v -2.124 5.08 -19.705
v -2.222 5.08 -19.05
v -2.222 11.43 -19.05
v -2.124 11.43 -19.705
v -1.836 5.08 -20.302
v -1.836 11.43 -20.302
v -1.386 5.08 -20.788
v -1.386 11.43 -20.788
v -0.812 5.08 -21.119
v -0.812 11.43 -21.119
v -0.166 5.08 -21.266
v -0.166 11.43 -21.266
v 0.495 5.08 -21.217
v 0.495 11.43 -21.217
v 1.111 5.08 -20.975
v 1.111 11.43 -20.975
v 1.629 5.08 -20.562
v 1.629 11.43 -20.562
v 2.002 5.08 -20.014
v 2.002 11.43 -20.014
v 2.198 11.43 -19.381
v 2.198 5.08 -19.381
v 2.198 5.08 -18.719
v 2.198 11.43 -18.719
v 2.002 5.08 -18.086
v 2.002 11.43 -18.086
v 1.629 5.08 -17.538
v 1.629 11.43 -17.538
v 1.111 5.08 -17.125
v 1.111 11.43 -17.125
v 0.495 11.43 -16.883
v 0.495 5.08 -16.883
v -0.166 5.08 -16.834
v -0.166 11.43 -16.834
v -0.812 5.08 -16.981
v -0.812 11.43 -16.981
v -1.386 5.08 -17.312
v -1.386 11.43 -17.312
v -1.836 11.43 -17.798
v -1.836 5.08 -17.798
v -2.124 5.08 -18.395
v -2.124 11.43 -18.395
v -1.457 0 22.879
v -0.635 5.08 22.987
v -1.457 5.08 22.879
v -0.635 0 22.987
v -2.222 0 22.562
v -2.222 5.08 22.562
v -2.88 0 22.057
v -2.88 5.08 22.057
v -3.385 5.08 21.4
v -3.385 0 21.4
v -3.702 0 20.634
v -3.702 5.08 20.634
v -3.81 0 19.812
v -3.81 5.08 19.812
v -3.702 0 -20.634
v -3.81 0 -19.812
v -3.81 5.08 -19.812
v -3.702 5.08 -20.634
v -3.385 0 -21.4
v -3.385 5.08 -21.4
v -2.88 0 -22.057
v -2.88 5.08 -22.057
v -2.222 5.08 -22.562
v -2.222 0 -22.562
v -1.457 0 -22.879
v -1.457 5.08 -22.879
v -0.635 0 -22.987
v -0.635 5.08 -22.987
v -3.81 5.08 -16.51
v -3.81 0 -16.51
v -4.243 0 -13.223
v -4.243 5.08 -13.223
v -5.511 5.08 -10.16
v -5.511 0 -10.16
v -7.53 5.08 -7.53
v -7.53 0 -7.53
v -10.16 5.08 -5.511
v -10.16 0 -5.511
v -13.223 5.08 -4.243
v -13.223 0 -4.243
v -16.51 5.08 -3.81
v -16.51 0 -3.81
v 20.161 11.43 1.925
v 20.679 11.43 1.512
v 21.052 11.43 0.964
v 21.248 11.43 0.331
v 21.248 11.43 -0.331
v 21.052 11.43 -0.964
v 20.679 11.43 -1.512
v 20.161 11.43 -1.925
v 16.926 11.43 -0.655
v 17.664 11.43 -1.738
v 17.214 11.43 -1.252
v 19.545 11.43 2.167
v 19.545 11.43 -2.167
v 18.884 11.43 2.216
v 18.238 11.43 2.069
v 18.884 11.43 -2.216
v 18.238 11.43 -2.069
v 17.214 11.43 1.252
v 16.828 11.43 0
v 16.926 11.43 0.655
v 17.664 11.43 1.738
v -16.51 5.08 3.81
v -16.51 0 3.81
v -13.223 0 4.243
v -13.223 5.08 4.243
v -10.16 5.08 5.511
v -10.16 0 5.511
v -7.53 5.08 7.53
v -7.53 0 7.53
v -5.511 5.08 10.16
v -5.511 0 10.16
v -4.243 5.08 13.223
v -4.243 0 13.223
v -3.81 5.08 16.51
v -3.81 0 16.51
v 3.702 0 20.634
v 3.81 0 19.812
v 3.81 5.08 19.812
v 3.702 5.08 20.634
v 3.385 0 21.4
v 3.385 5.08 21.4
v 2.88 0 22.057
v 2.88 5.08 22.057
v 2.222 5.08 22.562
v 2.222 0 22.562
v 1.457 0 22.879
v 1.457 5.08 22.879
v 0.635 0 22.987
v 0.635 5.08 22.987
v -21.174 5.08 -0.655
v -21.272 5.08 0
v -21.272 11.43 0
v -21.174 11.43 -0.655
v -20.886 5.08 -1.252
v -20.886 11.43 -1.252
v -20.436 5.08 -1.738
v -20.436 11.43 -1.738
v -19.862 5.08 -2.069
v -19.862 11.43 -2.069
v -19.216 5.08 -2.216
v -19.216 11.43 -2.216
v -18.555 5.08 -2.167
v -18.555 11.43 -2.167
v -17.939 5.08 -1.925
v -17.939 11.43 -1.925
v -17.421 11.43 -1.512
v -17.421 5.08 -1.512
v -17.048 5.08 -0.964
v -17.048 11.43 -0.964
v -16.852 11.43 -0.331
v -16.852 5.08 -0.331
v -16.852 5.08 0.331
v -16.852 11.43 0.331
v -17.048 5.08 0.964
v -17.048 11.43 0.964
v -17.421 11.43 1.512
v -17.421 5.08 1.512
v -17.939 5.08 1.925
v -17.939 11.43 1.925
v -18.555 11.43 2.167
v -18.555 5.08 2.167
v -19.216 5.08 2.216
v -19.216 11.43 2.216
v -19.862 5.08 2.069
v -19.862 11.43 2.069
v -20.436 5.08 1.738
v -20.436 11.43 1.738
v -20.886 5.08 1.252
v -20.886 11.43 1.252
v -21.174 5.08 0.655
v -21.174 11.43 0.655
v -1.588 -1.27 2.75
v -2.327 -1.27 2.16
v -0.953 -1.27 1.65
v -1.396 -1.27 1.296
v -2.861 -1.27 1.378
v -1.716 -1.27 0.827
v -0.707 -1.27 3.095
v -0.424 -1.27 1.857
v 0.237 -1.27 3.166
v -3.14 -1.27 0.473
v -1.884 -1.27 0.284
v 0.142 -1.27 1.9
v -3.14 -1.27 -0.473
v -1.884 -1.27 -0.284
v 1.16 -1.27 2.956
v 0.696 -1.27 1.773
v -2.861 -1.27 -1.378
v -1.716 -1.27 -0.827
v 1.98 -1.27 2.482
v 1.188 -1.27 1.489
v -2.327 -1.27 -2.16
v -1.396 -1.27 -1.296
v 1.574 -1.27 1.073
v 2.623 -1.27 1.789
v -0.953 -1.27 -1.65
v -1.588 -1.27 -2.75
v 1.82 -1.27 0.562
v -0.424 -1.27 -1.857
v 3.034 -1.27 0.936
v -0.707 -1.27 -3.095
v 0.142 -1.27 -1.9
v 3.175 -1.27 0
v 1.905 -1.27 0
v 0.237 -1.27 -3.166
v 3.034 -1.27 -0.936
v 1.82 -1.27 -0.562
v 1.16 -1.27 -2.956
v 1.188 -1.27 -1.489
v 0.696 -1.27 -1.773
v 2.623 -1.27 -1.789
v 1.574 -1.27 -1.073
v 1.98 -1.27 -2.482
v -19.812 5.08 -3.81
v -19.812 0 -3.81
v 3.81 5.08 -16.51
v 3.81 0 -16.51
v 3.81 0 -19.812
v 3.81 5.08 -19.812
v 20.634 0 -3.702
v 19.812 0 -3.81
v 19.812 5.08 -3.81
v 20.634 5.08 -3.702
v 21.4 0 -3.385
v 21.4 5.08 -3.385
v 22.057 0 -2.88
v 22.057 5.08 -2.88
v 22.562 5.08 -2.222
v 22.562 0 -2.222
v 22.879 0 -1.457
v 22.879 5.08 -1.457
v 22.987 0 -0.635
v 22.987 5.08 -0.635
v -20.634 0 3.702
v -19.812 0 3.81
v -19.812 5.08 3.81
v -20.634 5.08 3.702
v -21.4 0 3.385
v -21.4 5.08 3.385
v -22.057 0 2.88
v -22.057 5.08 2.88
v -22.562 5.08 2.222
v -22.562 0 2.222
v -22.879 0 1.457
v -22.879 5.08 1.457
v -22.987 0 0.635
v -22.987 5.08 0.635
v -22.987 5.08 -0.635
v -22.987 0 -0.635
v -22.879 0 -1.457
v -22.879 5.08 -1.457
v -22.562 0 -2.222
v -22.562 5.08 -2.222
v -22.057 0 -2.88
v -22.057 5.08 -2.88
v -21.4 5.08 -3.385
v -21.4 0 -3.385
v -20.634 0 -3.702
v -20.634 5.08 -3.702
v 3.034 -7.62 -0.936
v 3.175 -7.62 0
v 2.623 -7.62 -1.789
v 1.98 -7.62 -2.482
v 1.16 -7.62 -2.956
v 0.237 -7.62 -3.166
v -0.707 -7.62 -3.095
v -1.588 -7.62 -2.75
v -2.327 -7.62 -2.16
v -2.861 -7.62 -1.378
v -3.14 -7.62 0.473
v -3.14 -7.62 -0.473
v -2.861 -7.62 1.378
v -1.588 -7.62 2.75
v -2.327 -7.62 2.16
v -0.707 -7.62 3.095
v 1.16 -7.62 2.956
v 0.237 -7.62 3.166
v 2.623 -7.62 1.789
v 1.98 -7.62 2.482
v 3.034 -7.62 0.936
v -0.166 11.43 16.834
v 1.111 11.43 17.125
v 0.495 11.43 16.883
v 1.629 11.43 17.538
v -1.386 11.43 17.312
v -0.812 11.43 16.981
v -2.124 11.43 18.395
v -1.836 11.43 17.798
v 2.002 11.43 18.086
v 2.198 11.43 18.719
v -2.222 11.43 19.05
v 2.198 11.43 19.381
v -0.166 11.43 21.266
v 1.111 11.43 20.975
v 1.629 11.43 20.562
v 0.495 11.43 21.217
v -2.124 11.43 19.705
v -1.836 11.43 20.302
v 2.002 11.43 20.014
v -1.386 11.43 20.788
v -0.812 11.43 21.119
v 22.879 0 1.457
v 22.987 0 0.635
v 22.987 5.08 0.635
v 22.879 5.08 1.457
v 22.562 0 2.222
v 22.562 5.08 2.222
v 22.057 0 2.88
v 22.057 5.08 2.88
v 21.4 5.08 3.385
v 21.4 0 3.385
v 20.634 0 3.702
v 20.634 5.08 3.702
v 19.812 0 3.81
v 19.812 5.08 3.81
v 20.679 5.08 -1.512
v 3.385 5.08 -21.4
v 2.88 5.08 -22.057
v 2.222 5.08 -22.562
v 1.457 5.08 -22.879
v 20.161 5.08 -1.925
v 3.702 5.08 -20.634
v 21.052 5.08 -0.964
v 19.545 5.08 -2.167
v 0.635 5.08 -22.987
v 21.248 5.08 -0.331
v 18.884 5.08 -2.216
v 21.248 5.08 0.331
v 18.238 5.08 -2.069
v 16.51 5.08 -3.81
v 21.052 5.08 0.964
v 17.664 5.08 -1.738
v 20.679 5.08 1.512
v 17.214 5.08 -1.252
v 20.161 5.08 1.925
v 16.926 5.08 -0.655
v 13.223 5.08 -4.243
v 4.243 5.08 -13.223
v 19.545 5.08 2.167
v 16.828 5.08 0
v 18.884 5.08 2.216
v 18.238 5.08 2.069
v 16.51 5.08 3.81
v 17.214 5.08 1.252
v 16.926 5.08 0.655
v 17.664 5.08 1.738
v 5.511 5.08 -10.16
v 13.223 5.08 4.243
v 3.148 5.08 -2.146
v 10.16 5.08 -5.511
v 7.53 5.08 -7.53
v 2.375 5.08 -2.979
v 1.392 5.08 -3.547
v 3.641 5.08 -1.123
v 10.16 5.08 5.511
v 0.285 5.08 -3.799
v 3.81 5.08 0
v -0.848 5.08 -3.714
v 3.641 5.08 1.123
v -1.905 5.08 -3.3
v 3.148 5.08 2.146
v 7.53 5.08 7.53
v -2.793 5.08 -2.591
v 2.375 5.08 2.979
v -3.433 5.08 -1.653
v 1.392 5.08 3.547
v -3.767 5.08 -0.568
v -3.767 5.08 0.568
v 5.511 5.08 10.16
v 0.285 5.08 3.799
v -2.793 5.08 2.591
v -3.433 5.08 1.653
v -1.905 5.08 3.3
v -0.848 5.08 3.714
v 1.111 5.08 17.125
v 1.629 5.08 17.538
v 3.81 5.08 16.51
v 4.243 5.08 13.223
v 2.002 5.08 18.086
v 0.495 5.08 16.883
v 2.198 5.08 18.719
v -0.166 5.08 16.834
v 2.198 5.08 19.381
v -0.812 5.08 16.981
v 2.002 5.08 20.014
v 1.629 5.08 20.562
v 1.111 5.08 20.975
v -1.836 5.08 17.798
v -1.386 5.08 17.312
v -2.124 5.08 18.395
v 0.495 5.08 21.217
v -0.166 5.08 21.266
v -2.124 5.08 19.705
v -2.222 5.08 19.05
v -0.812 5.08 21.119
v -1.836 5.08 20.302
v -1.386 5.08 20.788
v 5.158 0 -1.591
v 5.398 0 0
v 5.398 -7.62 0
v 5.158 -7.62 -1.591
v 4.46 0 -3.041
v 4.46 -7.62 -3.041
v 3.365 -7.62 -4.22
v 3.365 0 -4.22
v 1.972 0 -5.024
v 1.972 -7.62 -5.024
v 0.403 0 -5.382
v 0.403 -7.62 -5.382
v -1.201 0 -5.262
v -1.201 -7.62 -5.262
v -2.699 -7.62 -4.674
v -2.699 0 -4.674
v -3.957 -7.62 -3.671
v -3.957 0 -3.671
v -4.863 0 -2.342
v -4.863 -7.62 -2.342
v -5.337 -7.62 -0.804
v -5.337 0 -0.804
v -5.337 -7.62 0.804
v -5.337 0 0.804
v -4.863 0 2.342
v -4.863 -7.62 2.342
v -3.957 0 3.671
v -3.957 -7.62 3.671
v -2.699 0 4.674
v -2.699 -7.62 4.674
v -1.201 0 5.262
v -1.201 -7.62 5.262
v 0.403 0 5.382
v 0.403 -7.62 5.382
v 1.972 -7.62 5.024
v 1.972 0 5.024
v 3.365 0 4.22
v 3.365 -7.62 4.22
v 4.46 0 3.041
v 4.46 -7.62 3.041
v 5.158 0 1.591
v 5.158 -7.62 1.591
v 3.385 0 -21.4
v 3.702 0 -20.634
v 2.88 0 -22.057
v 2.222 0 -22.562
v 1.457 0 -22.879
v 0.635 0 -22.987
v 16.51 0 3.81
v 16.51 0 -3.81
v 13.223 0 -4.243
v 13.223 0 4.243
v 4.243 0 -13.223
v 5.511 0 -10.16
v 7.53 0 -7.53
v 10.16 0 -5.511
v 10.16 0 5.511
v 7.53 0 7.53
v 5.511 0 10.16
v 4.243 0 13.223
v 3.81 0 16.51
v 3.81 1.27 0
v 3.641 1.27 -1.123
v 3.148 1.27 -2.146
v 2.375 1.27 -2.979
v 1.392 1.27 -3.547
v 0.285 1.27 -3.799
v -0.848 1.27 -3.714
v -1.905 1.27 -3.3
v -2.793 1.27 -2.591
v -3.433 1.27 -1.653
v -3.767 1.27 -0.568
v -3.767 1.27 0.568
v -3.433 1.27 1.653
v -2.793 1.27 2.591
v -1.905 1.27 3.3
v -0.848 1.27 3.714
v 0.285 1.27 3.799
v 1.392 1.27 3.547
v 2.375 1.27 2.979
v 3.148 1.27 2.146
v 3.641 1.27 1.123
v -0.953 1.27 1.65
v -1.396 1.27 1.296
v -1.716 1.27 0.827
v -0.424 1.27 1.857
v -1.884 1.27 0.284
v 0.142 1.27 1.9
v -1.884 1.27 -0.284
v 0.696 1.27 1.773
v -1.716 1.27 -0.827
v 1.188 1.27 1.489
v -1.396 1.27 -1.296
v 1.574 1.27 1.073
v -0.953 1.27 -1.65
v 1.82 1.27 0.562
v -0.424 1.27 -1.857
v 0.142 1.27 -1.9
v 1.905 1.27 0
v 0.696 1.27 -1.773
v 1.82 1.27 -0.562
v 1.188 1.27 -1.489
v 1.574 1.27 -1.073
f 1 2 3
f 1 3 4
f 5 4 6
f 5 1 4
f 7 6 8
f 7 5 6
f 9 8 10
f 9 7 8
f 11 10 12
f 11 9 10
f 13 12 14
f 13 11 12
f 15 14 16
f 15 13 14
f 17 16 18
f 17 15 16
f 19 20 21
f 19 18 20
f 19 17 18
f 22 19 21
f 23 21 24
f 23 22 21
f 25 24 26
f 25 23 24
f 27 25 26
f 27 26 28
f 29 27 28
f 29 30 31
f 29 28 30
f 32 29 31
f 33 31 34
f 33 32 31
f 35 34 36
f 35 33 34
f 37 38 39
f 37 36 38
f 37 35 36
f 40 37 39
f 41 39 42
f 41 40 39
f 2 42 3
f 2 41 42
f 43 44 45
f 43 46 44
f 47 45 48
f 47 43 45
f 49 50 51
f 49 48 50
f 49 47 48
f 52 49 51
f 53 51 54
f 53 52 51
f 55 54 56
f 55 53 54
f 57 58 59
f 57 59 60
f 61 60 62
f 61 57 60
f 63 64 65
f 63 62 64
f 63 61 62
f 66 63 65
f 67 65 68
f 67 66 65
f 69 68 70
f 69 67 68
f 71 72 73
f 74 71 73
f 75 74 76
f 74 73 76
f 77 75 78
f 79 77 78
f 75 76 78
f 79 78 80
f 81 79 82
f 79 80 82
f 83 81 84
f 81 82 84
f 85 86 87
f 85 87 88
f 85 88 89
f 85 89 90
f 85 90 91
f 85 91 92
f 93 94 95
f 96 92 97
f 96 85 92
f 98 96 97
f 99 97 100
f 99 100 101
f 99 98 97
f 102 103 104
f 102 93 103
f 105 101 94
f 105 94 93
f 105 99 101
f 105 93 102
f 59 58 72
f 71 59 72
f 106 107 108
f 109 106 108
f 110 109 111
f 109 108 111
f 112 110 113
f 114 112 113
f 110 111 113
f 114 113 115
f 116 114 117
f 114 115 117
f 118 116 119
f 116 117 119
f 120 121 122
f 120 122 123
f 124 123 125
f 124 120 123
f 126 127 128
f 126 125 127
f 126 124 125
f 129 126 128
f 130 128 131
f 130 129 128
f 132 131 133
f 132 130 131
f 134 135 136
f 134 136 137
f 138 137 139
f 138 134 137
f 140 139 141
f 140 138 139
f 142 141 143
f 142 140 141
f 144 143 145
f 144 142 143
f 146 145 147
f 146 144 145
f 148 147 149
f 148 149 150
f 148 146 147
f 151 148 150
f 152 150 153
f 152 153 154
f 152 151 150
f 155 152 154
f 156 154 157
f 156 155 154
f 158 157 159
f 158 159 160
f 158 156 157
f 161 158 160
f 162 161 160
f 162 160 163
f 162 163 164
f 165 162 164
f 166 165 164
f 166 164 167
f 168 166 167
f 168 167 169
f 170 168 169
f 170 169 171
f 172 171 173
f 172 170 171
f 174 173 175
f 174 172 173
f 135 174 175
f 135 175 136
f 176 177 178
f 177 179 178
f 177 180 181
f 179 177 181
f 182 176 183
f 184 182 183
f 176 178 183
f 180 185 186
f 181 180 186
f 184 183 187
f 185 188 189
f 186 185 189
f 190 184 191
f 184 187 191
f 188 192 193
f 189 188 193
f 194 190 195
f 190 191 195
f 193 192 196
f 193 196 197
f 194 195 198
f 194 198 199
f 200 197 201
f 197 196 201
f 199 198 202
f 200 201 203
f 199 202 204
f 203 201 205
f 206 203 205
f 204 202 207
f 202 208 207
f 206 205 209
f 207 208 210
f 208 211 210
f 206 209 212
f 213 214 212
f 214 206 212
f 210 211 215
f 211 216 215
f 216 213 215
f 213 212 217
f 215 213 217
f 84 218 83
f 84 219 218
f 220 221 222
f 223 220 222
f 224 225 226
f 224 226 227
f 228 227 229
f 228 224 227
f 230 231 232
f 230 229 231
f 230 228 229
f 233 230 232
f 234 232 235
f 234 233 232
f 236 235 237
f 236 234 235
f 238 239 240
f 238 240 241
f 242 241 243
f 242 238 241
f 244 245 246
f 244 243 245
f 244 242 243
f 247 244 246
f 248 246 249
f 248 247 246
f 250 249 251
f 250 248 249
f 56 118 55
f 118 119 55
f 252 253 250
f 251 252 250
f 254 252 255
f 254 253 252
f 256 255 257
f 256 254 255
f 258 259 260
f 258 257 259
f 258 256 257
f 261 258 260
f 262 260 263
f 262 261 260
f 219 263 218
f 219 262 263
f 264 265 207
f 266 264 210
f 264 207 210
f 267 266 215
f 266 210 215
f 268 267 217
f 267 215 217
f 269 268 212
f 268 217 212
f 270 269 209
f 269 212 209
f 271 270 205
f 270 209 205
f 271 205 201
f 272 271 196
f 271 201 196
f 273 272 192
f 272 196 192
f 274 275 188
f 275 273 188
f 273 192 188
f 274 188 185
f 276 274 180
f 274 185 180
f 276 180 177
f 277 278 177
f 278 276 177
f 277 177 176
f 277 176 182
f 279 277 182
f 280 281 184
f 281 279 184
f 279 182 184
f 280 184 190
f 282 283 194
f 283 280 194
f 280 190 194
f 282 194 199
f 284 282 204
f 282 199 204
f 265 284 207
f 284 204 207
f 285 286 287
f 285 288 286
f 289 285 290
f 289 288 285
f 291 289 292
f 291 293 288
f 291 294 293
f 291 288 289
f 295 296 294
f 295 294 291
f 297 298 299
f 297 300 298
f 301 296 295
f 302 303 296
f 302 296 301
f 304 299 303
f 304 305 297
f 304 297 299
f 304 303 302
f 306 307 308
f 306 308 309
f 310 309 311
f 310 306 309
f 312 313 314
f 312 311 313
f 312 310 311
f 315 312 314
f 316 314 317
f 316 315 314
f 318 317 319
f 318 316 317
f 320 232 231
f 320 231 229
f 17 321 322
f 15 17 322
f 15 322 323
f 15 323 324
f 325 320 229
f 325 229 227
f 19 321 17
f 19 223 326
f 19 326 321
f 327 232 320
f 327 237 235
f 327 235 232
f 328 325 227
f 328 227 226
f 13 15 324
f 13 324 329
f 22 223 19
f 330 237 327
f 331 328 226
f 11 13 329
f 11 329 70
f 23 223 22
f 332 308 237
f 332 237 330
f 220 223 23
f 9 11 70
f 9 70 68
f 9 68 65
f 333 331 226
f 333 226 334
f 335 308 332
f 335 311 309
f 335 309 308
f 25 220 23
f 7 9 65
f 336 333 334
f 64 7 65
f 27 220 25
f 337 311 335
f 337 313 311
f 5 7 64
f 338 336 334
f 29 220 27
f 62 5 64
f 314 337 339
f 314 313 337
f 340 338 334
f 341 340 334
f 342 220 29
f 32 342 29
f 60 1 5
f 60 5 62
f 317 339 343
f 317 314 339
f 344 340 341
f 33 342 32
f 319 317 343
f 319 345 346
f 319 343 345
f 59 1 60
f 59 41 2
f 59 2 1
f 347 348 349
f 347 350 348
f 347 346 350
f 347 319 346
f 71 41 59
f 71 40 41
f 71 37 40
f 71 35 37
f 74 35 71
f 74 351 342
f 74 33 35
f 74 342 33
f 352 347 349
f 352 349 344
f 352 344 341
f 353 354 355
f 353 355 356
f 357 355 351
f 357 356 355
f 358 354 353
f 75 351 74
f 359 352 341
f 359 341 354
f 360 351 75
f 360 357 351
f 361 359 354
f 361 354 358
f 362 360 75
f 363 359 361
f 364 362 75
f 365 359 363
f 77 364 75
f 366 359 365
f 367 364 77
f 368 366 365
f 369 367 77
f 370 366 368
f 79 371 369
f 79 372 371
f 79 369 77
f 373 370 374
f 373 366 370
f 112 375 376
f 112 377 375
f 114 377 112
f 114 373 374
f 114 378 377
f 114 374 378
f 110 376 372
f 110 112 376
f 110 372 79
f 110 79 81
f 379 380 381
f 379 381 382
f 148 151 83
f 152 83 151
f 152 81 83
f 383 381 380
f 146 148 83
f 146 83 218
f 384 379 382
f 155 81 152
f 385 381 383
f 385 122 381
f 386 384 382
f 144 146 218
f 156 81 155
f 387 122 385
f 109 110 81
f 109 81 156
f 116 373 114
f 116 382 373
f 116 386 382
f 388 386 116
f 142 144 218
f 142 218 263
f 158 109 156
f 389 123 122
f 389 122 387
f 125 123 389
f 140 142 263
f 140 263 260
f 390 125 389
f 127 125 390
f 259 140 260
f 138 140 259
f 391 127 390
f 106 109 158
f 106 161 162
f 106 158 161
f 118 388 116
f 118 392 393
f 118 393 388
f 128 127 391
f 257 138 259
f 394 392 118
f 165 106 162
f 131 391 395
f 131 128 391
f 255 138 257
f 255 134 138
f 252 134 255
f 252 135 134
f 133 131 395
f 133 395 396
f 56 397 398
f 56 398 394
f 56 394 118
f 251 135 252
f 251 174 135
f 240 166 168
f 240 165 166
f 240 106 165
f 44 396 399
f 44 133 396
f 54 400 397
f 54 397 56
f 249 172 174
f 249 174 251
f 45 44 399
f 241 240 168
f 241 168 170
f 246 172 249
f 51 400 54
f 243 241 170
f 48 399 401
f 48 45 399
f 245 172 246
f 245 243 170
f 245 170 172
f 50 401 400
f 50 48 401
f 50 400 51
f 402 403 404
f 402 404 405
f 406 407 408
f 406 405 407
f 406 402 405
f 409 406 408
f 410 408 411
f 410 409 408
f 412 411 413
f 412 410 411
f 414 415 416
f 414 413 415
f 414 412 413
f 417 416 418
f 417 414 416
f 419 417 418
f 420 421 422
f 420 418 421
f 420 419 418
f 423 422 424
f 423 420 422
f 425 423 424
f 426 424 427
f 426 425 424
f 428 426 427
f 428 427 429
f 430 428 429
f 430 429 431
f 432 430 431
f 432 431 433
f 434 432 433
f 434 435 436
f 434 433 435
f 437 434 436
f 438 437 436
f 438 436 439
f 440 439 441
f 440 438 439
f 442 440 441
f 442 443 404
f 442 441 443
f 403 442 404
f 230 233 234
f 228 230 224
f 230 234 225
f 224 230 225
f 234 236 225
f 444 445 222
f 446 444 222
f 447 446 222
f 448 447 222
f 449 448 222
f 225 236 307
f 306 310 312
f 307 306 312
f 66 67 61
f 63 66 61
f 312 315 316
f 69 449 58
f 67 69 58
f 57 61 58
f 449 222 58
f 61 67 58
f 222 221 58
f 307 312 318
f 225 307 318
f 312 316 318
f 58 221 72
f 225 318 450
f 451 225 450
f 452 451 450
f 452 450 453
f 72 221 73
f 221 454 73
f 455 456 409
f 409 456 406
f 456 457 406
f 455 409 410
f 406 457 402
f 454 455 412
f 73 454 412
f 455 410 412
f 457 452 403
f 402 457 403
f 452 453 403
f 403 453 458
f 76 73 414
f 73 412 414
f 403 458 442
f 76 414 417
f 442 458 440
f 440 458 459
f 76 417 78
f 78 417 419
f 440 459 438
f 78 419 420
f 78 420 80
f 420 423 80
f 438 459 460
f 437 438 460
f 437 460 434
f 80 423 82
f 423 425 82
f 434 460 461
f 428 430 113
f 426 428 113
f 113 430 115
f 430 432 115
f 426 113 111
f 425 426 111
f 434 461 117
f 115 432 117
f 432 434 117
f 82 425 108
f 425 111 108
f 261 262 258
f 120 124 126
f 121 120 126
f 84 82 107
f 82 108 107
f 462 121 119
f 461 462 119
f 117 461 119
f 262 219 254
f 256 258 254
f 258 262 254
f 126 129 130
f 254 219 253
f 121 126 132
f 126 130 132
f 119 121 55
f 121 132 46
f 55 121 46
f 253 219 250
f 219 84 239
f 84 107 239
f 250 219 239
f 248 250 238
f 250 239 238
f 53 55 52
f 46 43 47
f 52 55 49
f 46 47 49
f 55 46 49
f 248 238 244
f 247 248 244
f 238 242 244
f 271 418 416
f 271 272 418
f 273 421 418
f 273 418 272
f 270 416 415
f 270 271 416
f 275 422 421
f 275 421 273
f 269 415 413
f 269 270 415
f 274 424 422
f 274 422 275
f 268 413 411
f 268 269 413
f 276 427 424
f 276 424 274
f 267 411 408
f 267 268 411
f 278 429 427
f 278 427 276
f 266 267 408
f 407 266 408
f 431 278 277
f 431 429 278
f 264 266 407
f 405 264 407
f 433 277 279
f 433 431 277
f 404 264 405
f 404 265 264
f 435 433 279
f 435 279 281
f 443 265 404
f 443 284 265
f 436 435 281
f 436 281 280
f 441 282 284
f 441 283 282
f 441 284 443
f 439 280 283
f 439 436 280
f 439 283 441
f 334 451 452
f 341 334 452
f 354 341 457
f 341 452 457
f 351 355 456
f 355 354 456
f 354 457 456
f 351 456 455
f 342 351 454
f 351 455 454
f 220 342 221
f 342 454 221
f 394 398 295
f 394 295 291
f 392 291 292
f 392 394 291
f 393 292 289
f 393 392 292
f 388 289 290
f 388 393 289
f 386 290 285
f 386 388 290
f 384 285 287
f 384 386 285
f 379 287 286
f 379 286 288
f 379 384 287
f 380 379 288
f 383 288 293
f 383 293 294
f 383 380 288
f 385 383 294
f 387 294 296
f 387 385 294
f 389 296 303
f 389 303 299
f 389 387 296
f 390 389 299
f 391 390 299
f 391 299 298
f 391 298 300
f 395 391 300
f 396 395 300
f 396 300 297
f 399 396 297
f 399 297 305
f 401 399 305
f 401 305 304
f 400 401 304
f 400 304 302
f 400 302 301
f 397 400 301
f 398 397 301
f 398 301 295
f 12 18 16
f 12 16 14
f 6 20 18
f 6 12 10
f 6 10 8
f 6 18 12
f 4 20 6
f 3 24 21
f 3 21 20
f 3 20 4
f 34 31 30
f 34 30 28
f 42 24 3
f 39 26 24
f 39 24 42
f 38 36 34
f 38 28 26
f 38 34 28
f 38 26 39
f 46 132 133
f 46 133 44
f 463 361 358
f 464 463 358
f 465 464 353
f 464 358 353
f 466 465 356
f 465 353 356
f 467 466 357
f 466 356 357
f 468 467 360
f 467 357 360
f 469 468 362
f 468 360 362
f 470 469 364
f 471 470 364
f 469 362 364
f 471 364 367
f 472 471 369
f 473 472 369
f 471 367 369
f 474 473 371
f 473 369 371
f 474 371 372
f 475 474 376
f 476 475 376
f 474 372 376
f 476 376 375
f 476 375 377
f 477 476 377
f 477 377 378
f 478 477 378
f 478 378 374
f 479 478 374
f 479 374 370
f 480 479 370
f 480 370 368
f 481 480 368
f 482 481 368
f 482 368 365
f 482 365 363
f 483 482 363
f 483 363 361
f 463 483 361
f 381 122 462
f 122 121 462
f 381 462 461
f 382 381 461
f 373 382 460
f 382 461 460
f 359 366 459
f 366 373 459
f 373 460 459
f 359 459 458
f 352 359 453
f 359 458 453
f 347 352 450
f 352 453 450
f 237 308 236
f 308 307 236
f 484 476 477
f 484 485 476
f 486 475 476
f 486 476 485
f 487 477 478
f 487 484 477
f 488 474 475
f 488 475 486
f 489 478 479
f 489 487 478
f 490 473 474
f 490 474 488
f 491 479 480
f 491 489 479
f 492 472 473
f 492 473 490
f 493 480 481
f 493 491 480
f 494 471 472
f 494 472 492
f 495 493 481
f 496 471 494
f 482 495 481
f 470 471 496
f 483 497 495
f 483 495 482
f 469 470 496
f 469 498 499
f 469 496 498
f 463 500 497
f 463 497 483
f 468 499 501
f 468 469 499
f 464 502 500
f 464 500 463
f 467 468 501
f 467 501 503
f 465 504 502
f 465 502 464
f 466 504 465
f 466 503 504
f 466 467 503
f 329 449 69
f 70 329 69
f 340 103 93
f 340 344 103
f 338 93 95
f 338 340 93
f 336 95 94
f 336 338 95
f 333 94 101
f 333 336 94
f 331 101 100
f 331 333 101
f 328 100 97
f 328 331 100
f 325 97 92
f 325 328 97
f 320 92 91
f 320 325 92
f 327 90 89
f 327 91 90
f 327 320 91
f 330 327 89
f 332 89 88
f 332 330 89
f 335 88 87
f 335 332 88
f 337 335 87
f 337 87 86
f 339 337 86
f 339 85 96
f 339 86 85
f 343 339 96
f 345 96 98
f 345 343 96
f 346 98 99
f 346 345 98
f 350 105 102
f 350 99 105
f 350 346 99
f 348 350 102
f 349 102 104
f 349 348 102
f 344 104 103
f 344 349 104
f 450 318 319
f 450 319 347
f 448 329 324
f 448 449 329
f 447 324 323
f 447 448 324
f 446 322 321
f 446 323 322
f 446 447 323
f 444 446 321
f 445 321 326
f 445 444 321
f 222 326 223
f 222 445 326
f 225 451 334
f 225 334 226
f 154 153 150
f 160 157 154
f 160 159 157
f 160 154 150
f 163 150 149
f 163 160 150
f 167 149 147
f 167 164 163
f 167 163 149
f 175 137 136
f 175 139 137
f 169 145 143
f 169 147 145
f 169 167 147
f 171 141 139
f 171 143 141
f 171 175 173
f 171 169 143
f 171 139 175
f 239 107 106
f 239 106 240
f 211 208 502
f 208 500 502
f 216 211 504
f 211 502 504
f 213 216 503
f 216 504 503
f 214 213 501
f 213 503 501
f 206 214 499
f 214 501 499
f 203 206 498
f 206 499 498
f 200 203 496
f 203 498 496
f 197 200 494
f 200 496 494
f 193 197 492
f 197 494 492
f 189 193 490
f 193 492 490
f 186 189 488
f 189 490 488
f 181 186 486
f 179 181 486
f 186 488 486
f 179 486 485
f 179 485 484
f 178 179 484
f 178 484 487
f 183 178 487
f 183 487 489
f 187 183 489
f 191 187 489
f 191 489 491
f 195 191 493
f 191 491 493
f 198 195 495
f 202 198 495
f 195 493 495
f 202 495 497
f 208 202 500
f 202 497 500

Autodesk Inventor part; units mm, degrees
ref_plane "YZ Plane" through (0, 0, 0) normal (1, 0, 0) x (0, 1, 0)
ref_plane "XZ Plane" through (0, 0, 0) normal (0, 1, 0) x (-1, 0, 0)
ref_plane "XY Plane" through (0, 0, 0) normal (0, 0, 1) x (1, 0, 0)
sketch "Sketch1" plane through (0, 0, 0) normal (0, 1, 0) x (-1, 0, 0)
  circle A0 centre (0, 19.05) radius 2.2225
  circle A1 centre (-19.05, 0) radius 2.2225
  circle A2 centre (0, -19.05) radius 2.2225
  circle A3 centre (19.05, 0) radius 2.2225
  line L0 (0.635, 24.639) -> (0, 24.639)
  line L1 (0, 0) -> (0, 2.5439)
  line L2 (3.81, -19.812) -> (3.81, -16.51)
  line L3 (3.81, 16.51) -> (3.81, 19.812)
  line L4 (-19.812, 3.81) -> (-16.51, 3.81)
  line L5 (16.51, 3.81) -> (19.812, 3.81)
  line L6 (-3.81, 19.812) -> (-3.81, 16.51)
  line L7 (-3.81, -16.51) -> (-3.81, -19.812)
  line L8 (19.812, -3.81) -> (16.51, -3.81)
  line L9 (-16.51, -3.81) -> (-19.812, -3.81)
  arc A4 (3.81, 16.51) -> (16.51, 3.81) centre (16.51, 16.51) ccw
  arc A5 (16.51, -3.81) -> (3.81, -16.51) centre (16.51, -16.51) ccw
  arc A6 (-16.51, 3.81) -> (-3.81, 16.51) centre (-16.51, 16.51) ccw
  arc A7 (-3.81, -16.51) -> (-16.51, -3.81) centre (-16.51, -16.51) ccw
  line L10 (0, -3.81) -> (0, 0)
  line L11 (0, 3.81) -> (0, 0)
  line L12 (3.81, -19.812) -> (3.81, -16.51)
  line L13 (16.51, 3.81) -> (19.812, 3.81)
  line L14 (21.2725, 0) -> (16.8275, 0)
  line L15 (19.812, 3.81) -> (16.51, 3.81)
  line L16 (19.812, -3.81) -> (16.51, -3.81)
  line L17 (0, -3.81) -> (0.635, -3.81)
  line L18 (16.51, -3.81) -> (19.812, -3.81)
  line L19 (-19.812, -3.81) -> (-16.51, -3.81)
  line L20 (-3.81, -16.51) -> (-3.81, -19.812)
  line L21 (-3.81, -19.812) -> (-3.81, -16.51)
  line L22 (0, 0) -> (0.635, 0)
  line L23 (-0.635, 24.639) -> (0.635, 24.639)
  line L24 (0.635, 0) -> (0, 0)
  line L25 (-3.81, 16.51) -> (-3.81, 19.812)
  line L26 (22.987, -0.635) -> (22.987, 0.635)
  arc A8 (-24.0273, 24.8189) -> (-24.2117, 24.639) centre (0, 0) ccw
  line L27 (-19.812, 3.81) -> (-16.51, 3.81)
  line L28 (-3.81, 19.812) -> (-3.81, 16.51)
  line L29 (3.81, 19.812) -> (3.81, 16.51)
  line L30 (3.81, 19.812) -> (3.81, 16.51)
  line L31 (19.812, 3.81) -> (16.51, 3.81)
  line L32 (16.51, -3.81) -> (19.812, -3.81)
  line L33 (3.81, -16.51) -> (3.81, -19.812)
  line L34 (-19.812, -3.81) -> (-16.51, -3.81)
  line L35 (0, -3.81) -> (0.635, -3.81)
  line L36 (0.635, 3.81) -> (0, 3.81)
  line L37 (-16.51, 3.81) -> (-19.812, 3.81)
  arc A9 (19.812, -3.81) -> (22.987, -0.635) centre (19.812, -0.635) ccw
  arc A10 (22.987, 0.635) -> (19.812, 3.81) centre (19.812, 0.635) ccw
  line L38 (0, 0) -> (7.5297, 7.5297)
  line L39 (0, 0) -> (7.5297, -7.5297)
  circle A11 centre (0, 19.05) radius 2.2225
  line L40 (3.81, 16.51) -> (3.81, 19.812)
  line L41 (-3.81, 19.812) -> (-3.81, 16.51)
  line L42 (3.81, 16.51) -> (3.81, 19.812)
  line L43 (3.81, 19.812) -> (3.81, 16.51)
  line L44 (3.81, 19.812) -> (3.81, 16.51)
  line L45 (-3.81, 19.812) -> (-3.81, 16.51)
  line L46 (-3.81, 16.51) -> (-3.81, 19.812)
  line L47 (-3.81, 16.51) -> (-3.81, 19.812)
  line L48 (0, 21.2725) -> (0, 16.8275)
  arc A12 (-0.635, 22.987) -> (-3.81, 19.812) centre (-0.635, 19.812) ccw
  line L49 (-0.635, 22.987) -> (0.635, 22.987)
  arc A13 (3.81, 19.812) -> (0.635, 22.987) centre (0.635, 19.812) ccw
  arc A14 (3.81, 16.51) -> (16.51, 3.81) centre (16.51, 16.51) ccw
  arc A15 (-16.51, 3.81) -> (-3.81, 16.51) centre (-16.51, 16.51) ccw
  arc A16 (-16.51, 3.81) -> (-3.81, 16.51) centre (-16.51, 16.51) ccw
  line L50 (-3.81, 16.51) -> (-3.81, 19.812)
  arc A17 (-0.635, 22.987) -> (-3.81, 19.812) centre (-0.635, 19.812) ccw
  arc A18 (3.81, 19.812) -> (0.635, 22.987) centre (0.635, 19.812) ccw
  line L51 (0.635, 22.987) -> (-0.635, 22.987)
  arc A19 (3.81, 16.51) -> (16.51, 3.81) centre (16.51, 16.51) ccw
  line L52 (3.81, 19.812) -> (3.81, 16.51)
  arc A20 (-3.81, -16.51) -> (-16.51, -3.81) centre (-16.51, -16.51) ccw
  line L53 (-16.51, -3.81) -> (-19.812, -3.81)
  arc A21 (-22.987, -0.635) -> (-19.812, -3.81) centre (-19.812, -0.635) ccw
  arc A22 (-19.812, 3.81) -> (-22.987, 0.635) centre (-19.812, 0.635) ccw
  line L54 (-22.987, 0.635) -> (-22.987, -0.635)
  arc A23 (-16.51, 3.81) -> (-3.81, 16.51) centre (-16.51, 16.51) ccw
  line L55 (-19.812, 3.81) -> (-16.51, 3.81)
  arc A24 (16.51, -3.81) -> (3.81, -16.51) centre (16.51, -16.51) ccw
  line L56 (3.81, -16.51) -> (3.81, -19.812)
  arc A25 (0.635, -22.987) -> (3.81, -19.812) centre (0.635, -19.812) ccw
  arc A26 (-3.81, -19.812) -> (-0.635, -22.987) centre (-0.635, -19.812) ccw
  line L57 (-0.635, -22.987) -> (0.635, -22.987)
  arc A27 (-3.81, -16.51) -> (-16.51, -3.81) centre (-16.51, -16.51) ccw
  line L58 (-3.81, -19.812) -> (-3.81, -16.51)
  point P0 (19.05, 0)
  point P1 (0, -19.05)
  point P2 (-2.9852, -22.987)
  point P3 (-3.81, -29.2166)
  point P4 (0, 34.544)
  point P5 (-24.0273, 0)
  point P6 (0, -24.0273)
  point P7 (0, 19.05)
  point P8 (-7.5297, 7.5297)
  point P9 (7.5297, 7.5297)
  point P10 (-7.5297, -7.5297)
  point P11 (-7.5297, 7.5297)
  point P12 (7.5297, -7.5297)
  point P13 (-7.5297, -7.5297)
  dimension "d4" = 360
  dimension "d5" = 4.445
  dimension "d6" = 360
  dimension "d7" = 3.175
  dimension "d16" = 360
extrude "Extrusion1" add sketch "Sketch1" along normal blind 5.08
extrude "Extrusion2" add sketch "Sketch1" along normal blind 11.43 contours A0 L48 | L48 A0 | A1 | A2 | A3 L14 picked at (18.3725, -0.5216)
extrude "Extrusion3" add sketch "Sketch1" along normal blind 11.43 contours L14 A3 picked at (19.7275, 0.5216)
sketch "Sketch2" plane through (0, 5.08, 0) normal (0, 1, 0) x (1, 0, 0)
  circle A0 centre (0, 0) radius 2.8575
  dimension "d18" = 5.715
extrude "Extrusion4" cut sketch "Sketch2" against normal blind 11.43
sketch "Sketch3" plane through (0, 0, 0) normal (0, -1, 0) x (1, 0, 0)
  circle A0 centre (0, 0) radius 2.8575
  circle A1 centre (0, 0) radius 5.3975
  dimension "d21" = 2.54
  dimension "d22" = 5.715
extrude "Extrusion5" add sketch "Sketch3" along normal blind 5.08
sketch "Sketch4" plane through (0, 5.08, 0) normal (0, 1, 0) x (1, 0, 0)
  circle A0 centre (0, 0) radius 3.81
  dimension "d25" = 7.62
extrude "Extrusion6" cut sketch "Sketch4" against normal blind 3.81
sketch "Sketch5" plane through (0, 1.27, 0) normal (0, 1, 0) x (1, 0, 0)
  circle A0 centre (0, 0) radius 3.175
  dimension "d28" = 6.35
extrude "Extrusion7" cut sketch "Sketch5" against normal blind 50.8
sketch "Sketch6" plane through (0, 1.27, 0) normal (0, 1, 0) x (1, 0, 0)
  circle A0 centre (0, 0) radius 1.905
  circle A1 centre (0, 0) radius 3.175
  dimension "d31" = 3.81
extrude "Extrusion8" add sketch "Sketch6" against normal blind 2.54
sketch "Sketch7" plane through (0, -5.08, 0) normal (0, -1, 0) x (1, 0, 0)
  circle A0 centre (0, 0) radius 3.175
  circle A1 centre (0, 0) radius 5.3975
extrude "Extrusion9" add sketch "Sketch7" along normal blind 2.54
properties part number "planetaryGearMt2"
